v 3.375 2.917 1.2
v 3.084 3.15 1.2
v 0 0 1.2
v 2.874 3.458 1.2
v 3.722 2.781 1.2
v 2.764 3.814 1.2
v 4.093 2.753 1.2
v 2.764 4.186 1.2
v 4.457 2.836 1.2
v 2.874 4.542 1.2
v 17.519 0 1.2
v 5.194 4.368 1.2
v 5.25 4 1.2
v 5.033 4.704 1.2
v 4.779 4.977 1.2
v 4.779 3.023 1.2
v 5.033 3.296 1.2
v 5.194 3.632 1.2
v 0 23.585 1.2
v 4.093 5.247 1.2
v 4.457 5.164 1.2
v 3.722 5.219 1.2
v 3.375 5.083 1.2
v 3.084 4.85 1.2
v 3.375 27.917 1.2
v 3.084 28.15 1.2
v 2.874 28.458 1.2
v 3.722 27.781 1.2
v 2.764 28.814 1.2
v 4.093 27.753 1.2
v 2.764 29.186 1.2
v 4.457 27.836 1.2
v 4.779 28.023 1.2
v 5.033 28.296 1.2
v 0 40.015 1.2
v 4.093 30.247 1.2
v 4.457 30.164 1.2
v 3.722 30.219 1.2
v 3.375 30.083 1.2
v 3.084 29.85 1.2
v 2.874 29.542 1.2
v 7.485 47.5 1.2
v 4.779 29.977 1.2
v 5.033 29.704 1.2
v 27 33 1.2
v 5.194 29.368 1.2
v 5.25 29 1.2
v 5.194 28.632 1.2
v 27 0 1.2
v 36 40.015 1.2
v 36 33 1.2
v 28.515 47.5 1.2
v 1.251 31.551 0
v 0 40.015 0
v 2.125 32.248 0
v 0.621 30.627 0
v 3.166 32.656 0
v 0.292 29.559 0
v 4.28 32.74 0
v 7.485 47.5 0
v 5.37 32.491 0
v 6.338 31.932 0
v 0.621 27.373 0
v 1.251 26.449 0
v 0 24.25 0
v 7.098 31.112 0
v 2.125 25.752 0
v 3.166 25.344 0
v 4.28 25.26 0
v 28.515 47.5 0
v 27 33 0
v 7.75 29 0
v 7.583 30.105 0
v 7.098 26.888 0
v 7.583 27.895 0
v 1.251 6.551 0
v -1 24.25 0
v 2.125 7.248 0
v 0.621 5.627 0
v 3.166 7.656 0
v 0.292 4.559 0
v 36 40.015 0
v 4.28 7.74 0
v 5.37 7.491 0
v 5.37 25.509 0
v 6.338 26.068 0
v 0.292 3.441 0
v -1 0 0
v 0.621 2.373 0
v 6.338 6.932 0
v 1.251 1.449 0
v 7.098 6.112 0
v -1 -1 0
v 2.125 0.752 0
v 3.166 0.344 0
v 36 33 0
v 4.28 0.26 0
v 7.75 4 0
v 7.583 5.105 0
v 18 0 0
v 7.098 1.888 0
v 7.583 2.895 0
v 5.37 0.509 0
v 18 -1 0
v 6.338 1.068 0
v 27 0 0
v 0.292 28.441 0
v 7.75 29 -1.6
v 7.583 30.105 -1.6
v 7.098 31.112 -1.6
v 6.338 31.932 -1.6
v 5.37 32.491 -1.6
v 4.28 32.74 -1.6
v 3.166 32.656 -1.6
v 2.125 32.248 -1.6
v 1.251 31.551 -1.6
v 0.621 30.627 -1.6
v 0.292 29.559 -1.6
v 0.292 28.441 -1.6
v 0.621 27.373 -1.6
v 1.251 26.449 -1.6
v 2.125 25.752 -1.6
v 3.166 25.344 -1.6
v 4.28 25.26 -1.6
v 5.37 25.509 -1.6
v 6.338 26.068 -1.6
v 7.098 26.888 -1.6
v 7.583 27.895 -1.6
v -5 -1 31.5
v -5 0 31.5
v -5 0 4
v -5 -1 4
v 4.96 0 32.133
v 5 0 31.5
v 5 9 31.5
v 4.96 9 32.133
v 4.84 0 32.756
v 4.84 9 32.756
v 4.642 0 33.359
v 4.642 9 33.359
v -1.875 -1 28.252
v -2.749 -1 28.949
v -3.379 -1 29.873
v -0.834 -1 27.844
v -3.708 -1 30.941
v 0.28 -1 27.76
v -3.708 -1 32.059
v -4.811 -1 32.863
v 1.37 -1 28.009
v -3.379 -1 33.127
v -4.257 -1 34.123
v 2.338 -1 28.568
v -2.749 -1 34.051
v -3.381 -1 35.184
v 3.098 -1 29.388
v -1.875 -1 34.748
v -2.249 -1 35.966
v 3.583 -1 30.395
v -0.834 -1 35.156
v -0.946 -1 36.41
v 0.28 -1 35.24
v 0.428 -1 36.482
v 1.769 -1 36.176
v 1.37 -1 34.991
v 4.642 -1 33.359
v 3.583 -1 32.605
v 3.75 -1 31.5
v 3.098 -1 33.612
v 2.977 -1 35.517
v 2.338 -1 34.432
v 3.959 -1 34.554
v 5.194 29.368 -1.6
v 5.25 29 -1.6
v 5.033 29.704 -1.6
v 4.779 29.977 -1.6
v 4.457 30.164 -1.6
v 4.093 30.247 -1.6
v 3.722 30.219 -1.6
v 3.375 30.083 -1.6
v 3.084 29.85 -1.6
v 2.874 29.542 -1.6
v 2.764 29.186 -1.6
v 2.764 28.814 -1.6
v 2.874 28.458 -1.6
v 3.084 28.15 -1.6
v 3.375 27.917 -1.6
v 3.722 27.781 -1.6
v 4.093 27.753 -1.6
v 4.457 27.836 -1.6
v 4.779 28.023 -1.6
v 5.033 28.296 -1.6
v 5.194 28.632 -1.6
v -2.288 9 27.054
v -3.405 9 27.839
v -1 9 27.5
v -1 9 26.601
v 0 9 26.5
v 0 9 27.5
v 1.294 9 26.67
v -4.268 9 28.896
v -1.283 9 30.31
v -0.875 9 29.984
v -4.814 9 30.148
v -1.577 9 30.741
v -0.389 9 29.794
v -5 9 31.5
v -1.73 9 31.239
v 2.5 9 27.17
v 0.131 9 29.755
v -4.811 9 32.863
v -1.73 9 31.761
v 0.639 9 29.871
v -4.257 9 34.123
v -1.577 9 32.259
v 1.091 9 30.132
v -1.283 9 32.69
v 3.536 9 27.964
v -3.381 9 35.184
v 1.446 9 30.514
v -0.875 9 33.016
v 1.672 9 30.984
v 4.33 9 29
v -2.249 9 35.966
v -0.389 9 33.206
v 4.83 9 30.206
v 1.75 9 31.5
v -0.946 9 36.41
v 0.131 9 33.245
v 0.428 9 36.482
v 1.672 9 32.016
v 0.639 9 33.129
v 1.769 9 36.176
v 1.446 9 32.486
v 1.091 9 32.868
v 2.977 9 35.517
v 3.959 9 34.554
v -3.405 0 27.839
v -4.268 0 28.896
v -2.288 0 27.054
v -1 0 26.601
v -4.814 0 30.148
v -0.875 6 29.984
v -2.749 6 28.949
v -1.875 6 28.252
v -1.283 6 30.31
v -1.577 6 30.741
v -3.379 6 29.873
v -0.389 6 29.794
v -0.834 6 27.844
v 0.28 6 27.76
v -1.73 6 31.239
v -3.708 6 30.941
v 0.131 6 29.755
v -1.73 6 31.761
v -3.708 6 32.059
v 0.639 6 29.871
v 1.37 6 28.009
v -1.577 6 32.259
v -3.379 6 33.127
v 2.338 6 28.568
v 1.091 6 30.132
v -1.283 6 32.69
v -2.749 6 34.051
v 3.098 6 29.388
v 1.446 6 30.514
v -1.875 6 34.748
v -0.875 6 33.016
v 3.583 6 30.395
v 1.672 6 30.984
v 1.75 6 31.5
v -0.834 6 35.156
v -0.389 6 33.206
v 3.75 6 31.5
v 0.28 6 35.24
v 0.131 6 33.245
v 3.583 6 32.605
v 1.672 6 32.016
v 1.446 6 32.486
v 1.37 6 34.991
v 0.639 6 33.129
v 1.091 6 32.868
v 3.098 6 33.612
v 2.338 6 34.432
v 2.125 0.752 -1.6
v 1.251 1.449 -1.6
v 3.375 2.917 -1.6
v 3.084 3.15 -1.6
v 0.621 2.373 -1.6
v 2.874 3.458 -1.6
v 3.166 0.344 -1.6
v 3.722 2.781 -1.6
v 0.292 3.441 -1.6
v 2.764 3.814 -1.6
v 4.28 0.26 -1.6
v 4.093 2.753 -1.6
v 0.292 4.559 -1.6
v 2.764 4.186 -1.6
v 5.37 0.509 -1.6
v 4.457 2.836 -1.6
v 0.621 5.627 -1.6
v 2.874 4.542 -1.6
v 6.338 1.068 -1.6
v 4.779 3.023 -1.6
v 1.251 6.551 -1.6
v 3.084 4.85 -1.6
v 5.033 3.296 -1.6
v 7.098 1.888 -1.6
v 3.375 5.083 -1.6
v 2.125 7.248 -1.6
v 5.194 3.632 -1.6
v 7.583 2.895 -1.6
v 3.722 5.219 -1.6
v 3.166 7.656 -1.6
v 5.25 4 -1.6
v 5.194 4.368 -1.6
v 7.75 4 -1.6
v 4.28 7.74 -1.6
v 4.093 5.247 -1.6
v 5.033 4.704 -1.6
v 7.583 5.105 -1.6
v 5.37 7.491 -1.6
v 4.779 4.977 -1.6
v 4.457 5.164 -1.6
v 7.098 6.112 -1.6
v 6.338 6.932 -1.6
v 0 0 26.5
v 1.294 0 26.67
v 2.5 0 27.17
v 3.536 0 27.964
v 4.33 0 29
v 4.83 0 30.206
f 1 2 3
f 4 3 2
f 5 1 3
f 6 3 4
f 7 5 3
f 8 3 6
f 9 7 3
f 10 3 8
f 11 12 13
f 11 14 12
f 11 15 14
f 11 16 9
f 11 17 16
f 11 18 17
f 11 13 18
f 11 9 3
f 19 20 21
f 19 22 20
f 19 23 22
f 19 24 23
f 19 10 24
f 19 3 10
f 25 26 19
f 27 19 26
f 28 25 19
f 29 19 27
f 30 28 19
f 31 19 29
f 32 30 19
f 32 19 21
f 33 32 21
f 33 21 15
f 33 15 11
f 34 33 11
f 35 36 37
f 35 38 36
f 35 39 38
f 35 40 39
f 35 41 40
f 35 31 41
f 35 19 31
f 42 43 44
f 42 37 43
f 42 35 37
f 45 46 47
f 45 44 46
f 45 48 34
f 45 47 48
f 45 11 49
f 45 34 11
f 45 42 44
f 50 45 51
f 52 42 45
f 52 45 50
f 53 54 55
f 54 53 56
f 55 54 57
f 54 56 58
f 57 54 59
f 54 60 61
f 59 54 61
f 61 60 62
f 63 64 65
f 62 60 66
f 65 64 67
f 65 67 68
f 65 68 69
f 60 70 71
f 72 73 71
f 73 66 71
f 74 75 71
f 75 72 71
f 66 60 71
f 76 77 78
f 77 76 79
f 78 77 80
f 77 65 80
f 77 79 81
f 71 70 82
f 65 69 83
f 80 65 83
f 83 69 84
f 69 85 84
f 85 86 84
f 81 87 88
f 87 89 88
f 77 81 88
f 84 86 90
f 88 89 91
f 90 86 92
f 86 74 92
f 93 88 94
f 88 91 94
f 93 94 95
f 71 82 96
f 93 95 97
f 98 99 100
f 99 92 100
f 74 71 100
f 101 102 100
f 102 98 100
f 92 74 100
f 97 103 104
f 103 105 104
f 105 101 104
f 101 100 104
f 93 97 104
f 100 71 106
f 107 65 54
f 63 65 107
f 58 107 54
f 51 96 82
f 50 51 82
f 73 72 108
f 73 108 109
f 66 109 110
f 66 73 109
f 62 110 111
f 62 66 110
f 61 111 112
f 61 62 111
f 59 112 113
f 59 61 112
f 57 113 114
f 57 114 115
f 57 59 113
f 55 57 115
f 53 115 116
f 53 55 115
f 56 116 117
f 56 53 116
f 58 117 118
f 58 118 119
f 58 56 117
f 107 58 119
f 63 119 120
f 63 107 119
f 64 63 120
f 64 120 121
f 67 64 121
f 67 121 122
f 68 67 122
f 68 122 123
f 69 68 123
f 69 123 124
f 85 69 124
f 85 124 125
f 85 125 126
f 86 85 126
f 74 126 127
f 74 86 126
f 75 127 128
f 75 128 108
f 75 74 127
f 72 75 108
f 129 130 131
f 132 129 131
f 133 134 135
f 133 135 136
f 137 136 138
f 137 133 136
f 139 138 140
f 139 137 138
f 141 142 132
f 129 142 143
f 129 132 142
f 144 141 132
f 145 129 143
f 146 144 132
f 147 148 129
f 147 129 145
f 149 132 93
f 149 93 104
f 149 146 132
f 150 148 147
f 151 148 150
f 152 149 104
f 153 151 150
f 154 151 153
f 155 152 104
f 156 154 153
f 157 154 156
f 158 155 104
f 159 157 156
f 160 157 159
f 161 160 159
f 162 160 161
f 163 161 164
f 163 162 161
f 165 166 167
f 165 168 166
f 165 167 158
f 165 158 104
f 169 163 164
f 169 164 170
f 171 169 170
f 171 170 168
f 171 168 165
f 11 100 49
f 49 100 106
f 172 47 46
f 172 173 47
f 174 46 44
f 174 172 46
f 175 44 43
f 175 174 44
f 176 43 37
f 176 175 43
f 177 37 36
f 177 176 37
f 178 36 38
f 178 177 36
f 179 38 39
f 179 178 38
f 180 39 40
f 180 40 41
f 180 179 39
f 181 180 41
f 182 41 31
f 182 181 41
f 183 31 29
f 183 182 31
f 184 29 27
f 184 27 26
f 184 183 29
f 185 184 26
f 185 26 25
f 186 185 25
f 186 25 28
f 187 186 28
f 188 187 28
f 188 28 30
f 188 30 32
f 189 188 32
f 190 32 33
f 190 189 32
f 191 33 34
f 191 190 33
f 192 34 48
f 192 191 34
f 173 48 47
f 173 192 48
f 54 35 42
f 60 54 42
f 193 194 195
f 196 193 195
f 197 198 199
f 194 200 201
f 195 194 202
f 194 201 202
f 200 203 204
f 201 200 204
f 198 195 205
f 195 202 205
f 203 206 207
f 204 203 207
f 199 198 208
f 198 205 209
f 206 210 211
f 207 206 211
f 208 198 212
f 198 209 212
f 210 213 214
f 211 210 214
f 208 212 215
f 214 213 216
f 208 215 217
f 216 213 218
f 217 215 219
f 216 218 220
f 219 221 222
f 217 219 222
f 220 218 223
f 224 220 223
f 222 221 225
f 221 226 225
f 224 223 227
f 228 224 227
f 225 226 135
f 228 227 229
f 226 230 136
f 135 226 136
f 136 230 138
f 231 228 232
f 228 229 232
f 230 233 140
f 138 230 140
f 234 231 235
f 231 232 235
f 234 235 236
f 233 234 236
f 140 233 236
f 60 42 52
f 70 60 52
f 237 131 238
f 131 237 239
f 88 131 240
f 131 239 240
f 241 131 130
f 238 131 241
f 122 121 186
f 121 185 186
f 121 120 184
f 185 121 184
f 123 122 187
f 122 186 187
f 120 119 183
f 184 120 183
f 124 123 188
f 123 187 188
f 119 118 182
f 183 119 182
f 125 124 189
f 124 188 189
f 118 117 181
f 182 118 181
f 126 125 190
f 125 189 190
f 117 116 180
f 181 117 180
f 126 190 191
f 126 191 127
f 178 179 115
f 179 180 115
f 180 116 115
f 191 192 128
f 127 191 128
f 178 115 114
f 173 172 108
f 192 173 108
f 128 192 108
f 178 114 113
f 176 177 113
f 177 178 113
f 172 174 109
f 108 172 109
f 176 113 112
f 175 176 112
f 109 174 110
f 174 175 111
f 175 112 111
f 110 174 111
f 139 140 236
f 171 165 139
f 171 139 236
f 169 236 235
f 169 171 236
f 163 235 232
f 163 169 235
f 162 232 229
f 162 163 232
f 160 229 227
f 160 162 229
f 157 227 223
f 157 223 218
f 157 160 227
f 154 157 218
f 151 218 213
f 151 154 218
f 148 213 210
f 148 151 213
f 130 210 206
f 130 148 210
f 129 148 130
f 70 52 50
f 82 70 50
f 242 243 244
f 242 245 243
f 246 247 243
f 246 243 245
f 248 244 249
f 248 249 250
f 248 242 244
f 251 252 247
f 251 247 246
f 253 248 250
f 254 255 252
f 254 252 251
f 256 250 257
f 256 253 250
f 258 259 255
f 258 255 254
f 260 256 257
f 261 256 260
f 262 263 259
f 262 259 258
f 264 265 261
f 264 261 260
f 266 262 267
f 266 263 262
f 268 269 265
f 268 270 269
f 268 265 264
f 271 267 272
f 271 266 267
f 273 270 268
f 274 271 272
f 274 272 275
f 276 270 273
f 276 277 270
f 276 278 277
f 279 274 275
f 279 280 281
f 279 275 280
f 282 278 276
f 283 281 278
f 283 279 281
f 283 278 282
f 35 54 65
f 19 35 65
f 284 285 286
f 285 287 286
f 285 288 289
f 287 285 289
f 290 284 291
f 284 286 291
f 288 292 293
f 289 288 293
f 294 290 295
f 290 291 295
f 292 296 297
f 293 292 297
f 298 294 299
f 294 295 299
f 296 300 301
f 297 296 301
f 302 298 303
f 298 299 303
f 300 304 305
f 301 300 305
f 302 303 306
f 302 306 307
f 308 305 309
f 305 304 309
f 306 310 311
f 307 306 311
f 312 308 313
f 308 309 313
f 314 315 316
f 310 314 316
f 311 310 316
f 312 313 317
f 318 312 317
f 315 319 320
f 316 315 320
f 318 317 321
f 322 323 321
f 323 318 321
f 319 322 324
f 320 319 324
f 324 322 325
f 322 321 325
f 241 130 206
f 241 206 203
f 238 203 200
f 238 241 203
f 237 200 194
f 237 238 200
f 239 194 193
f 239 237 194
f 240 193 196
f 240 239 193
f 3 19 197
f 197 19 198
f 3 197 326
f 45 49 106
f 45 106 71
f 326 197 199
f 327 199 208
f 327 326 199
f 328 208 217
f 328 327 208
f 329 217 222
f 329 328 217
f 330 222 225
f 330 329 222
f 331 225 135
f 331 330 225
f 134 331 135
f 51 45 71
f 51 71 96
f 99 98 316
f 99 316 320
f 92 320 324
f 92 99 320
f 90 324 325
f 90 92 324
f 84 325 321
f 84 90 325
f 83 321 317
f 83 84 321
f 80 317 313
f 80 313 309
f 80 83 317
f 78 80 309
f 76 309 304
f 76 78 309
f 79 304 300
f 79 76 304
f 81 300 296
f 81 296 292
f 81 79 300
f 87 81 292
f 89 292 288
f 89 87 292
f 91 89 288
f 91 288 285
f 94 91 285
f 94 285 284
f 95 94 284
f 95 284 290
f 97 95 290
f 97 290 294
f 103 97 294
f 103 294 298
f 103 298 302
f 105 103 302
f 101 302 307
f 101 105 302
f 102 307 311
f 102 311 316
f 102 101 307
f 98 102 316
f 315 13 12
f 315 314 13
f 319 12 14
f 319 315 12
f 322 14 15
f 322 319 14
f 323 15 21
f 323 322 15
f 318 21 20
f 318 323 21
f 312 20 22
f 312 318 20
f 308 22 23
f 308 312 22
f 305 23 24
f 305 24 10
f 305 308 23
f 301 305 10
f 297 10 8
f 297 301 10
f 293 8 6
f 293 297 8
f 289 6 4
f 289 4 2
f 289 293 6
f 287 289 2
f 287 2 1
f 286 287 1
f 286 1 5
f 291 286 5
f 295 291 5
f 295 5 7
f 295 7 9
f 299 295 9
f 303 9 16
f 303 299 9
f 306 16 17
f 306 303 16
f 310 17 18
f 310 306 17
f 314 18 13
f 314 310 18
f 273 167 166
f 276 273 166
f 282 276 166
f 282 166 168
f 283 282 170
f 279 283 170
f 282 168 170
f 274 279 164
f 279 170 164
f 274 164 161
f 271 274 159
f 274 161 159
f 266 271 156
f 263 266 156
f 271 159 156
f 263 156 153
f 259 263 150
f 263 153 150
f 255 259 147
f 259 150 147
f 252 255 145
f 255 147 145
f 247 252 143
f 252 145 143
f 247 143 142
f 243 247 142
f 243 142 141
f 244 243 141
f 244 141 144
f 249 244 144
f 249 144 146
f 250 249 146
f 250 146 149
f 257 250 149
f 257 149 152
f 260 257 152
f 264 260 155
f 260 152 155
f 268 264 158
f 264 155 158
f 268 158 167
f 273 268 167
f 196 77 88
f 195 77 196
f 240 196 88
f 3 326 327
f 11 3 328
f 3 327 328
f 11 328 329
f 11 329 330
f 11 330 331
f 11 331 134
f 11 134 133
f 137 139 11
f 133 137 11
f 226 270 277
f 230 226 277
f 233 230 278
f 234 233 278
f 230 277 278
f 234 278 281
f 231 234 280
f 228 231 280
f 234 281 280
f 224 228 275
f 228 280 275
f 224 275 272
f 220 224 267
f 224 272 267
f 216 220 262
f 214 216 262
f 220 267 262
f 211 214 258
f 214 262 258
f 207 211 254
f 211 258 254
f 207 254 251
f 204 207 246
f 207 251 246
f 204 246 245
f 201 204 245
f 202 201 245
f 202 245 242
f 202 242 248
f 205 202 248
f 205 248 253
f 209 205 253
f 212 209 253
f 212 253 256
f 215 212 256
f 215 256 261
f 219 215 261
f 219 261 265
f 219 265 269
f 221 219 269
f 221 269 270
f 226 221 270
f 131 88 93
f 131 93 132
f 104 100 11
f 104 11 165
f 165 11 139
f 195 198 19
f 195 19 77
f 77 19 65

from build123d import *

# Parameters (mm, degrees)
F0_R      = 1.25
F1_DEPTH  = 1.2
F2_R      = 3.75
F2_R_2    = 1.25
F3_DEPTH  = 1.6
F4_R      = 1.75
F5_DEPTH  = 1
F6_DEPTH  = 9
F8_DEPTH  = 1
F10_DEPTH = 1.001
F11_R     = 3.75
F12_DEPTH = 7
F13_W     = 9
F13_H     = 33
F14_DEPTH = 2.801


with BuildPart() as f1:
    # F0 (on Top) → F1 (new body)
    with BuildSketch(Plane.XY):
        Polygon((0, 20), (0, 0), (36, 0), (36, 48.5), (0, 48.5), align=None)
        with Locations((4, 4)):
            Circle(F0_R, mode=Mode.SUBTRACT)
        with Locations((4, 29)):
            Circle(F0_R, mode=Mode.SUBTRACT)
    extrude(amount=F1_DEPTH)

    # F2 (on face) → F3 (join)
    with BuildSketch(Plane.XY):
        with Locations((4, 29)):
            Circle(F2_R)
        with Locations((4, 29)):
            Circle(F2_R_2, mode=Mode.SUBTRACT)
        with Locations((4, 4)):
            Circle(F2_R)
        with Locations((4, 4)):
            Circle(F2_R_2, mode=Mode.SUBTRACT)
    extrude(amount=-F3_DEPTH)

    # F4 (on Front) → F5 (join)
    with BuildSketch(Plane.XZ):
        with BuildLine():
            ThreePointArc((4.641671, 33.358733), (4.909601, 32.446479), (5, 31.5))
            ThreePointArc((5, 31.5), (0, 26.5), (-5, 31.5))
            Line((-5, 31.5), (-5, 0))
            Line((-5, 0), (0, 0))
            Line((0, 0), (18, 0))
            Line((18, 0), (4.641671, 33.358733))
        make_face()
        with BuildLine():
            ThreePointArc((-5, 31.5), (0, 26.5), (5, 31.5))
            ThreePointArc((5, 31.5), (4.909601, 32.446479), (4.641671, 33.358733))
            ThreePointArc((4.641671, 33.358733), (-0.946479, 36.409601), (-5, 31.5))
        make_face()
        with Locations((0, 31.5)):
            Circle(F4_R, mode=Mode.SUBTRACT)
    extrude(amount=F5_DEPTH)

    # F4 (on Front) → F6 (join)
    with BuildSketch(Plane.XZ):
        with BuildLine():
            ThreePointArc((-5, 31.5), (0, 26.5), (5, 31.5))
            ThreePointArc((5, 31.5), (4.909601, 32.446479), (4.641671, 33.358733))
            ThreePointArc((4.641671, 33.358733), (-0.946479, 36.409601), (-5, 31.5))
        make_face()
        with Locations((0, 31.5)):
            Circle(F4_R, mode=Mode.SUBTRACT)
    extrude(amount=-F6_DEPTH)

    # F7 (on face) → F8 (join)
    with BuildSketch(Plane(origin=(0, 0, 0), x_dir=(0, -1, 0), z_dir=(-1, 0, 0))):
        Polygon((-9, 27.5), (-24.25, 0), (0, 0), (0, 27.5), align=None)
    extrude(amount=F8_DEPTH)

    # F9 (on face) → F10 (cut, through all)
    with BuildSketch(Plane.XZ):
        Polygon((-5, 0), (-1, 0), (-5, 4), align=None)
    extrude(amount=F10_DEPTH, mode=Mode.SUBTRACT)

    # F11 (on face) → F12 (cut)
    with BuildSketch(Plane.XZ.offset(1)):
        with Locations((0, 31.5)):
            Circle(F11_R)
    extrude(amount=-F12_DEPTH, mode=Mode.SUBTRACT)

    # F13 (on face) → F14 (cut, through all)
    with BuildSketch(Plane.XY.offset(1.2)):
        Polygon((36, 48.5), (0, 48.5), (0, 47.5), (0, 40.014719), (7.485281, 47.5), (28.514719, 47.5), (36, 40.014719), (36, 47.5), align=None)
        with Locations((31.5, 16.5)):
            Rectangle(F13_W, F13_H)
    extrude(amount=-F14_DEPTH, mode=Mode.SUBTRACT)


solid = f1.part
